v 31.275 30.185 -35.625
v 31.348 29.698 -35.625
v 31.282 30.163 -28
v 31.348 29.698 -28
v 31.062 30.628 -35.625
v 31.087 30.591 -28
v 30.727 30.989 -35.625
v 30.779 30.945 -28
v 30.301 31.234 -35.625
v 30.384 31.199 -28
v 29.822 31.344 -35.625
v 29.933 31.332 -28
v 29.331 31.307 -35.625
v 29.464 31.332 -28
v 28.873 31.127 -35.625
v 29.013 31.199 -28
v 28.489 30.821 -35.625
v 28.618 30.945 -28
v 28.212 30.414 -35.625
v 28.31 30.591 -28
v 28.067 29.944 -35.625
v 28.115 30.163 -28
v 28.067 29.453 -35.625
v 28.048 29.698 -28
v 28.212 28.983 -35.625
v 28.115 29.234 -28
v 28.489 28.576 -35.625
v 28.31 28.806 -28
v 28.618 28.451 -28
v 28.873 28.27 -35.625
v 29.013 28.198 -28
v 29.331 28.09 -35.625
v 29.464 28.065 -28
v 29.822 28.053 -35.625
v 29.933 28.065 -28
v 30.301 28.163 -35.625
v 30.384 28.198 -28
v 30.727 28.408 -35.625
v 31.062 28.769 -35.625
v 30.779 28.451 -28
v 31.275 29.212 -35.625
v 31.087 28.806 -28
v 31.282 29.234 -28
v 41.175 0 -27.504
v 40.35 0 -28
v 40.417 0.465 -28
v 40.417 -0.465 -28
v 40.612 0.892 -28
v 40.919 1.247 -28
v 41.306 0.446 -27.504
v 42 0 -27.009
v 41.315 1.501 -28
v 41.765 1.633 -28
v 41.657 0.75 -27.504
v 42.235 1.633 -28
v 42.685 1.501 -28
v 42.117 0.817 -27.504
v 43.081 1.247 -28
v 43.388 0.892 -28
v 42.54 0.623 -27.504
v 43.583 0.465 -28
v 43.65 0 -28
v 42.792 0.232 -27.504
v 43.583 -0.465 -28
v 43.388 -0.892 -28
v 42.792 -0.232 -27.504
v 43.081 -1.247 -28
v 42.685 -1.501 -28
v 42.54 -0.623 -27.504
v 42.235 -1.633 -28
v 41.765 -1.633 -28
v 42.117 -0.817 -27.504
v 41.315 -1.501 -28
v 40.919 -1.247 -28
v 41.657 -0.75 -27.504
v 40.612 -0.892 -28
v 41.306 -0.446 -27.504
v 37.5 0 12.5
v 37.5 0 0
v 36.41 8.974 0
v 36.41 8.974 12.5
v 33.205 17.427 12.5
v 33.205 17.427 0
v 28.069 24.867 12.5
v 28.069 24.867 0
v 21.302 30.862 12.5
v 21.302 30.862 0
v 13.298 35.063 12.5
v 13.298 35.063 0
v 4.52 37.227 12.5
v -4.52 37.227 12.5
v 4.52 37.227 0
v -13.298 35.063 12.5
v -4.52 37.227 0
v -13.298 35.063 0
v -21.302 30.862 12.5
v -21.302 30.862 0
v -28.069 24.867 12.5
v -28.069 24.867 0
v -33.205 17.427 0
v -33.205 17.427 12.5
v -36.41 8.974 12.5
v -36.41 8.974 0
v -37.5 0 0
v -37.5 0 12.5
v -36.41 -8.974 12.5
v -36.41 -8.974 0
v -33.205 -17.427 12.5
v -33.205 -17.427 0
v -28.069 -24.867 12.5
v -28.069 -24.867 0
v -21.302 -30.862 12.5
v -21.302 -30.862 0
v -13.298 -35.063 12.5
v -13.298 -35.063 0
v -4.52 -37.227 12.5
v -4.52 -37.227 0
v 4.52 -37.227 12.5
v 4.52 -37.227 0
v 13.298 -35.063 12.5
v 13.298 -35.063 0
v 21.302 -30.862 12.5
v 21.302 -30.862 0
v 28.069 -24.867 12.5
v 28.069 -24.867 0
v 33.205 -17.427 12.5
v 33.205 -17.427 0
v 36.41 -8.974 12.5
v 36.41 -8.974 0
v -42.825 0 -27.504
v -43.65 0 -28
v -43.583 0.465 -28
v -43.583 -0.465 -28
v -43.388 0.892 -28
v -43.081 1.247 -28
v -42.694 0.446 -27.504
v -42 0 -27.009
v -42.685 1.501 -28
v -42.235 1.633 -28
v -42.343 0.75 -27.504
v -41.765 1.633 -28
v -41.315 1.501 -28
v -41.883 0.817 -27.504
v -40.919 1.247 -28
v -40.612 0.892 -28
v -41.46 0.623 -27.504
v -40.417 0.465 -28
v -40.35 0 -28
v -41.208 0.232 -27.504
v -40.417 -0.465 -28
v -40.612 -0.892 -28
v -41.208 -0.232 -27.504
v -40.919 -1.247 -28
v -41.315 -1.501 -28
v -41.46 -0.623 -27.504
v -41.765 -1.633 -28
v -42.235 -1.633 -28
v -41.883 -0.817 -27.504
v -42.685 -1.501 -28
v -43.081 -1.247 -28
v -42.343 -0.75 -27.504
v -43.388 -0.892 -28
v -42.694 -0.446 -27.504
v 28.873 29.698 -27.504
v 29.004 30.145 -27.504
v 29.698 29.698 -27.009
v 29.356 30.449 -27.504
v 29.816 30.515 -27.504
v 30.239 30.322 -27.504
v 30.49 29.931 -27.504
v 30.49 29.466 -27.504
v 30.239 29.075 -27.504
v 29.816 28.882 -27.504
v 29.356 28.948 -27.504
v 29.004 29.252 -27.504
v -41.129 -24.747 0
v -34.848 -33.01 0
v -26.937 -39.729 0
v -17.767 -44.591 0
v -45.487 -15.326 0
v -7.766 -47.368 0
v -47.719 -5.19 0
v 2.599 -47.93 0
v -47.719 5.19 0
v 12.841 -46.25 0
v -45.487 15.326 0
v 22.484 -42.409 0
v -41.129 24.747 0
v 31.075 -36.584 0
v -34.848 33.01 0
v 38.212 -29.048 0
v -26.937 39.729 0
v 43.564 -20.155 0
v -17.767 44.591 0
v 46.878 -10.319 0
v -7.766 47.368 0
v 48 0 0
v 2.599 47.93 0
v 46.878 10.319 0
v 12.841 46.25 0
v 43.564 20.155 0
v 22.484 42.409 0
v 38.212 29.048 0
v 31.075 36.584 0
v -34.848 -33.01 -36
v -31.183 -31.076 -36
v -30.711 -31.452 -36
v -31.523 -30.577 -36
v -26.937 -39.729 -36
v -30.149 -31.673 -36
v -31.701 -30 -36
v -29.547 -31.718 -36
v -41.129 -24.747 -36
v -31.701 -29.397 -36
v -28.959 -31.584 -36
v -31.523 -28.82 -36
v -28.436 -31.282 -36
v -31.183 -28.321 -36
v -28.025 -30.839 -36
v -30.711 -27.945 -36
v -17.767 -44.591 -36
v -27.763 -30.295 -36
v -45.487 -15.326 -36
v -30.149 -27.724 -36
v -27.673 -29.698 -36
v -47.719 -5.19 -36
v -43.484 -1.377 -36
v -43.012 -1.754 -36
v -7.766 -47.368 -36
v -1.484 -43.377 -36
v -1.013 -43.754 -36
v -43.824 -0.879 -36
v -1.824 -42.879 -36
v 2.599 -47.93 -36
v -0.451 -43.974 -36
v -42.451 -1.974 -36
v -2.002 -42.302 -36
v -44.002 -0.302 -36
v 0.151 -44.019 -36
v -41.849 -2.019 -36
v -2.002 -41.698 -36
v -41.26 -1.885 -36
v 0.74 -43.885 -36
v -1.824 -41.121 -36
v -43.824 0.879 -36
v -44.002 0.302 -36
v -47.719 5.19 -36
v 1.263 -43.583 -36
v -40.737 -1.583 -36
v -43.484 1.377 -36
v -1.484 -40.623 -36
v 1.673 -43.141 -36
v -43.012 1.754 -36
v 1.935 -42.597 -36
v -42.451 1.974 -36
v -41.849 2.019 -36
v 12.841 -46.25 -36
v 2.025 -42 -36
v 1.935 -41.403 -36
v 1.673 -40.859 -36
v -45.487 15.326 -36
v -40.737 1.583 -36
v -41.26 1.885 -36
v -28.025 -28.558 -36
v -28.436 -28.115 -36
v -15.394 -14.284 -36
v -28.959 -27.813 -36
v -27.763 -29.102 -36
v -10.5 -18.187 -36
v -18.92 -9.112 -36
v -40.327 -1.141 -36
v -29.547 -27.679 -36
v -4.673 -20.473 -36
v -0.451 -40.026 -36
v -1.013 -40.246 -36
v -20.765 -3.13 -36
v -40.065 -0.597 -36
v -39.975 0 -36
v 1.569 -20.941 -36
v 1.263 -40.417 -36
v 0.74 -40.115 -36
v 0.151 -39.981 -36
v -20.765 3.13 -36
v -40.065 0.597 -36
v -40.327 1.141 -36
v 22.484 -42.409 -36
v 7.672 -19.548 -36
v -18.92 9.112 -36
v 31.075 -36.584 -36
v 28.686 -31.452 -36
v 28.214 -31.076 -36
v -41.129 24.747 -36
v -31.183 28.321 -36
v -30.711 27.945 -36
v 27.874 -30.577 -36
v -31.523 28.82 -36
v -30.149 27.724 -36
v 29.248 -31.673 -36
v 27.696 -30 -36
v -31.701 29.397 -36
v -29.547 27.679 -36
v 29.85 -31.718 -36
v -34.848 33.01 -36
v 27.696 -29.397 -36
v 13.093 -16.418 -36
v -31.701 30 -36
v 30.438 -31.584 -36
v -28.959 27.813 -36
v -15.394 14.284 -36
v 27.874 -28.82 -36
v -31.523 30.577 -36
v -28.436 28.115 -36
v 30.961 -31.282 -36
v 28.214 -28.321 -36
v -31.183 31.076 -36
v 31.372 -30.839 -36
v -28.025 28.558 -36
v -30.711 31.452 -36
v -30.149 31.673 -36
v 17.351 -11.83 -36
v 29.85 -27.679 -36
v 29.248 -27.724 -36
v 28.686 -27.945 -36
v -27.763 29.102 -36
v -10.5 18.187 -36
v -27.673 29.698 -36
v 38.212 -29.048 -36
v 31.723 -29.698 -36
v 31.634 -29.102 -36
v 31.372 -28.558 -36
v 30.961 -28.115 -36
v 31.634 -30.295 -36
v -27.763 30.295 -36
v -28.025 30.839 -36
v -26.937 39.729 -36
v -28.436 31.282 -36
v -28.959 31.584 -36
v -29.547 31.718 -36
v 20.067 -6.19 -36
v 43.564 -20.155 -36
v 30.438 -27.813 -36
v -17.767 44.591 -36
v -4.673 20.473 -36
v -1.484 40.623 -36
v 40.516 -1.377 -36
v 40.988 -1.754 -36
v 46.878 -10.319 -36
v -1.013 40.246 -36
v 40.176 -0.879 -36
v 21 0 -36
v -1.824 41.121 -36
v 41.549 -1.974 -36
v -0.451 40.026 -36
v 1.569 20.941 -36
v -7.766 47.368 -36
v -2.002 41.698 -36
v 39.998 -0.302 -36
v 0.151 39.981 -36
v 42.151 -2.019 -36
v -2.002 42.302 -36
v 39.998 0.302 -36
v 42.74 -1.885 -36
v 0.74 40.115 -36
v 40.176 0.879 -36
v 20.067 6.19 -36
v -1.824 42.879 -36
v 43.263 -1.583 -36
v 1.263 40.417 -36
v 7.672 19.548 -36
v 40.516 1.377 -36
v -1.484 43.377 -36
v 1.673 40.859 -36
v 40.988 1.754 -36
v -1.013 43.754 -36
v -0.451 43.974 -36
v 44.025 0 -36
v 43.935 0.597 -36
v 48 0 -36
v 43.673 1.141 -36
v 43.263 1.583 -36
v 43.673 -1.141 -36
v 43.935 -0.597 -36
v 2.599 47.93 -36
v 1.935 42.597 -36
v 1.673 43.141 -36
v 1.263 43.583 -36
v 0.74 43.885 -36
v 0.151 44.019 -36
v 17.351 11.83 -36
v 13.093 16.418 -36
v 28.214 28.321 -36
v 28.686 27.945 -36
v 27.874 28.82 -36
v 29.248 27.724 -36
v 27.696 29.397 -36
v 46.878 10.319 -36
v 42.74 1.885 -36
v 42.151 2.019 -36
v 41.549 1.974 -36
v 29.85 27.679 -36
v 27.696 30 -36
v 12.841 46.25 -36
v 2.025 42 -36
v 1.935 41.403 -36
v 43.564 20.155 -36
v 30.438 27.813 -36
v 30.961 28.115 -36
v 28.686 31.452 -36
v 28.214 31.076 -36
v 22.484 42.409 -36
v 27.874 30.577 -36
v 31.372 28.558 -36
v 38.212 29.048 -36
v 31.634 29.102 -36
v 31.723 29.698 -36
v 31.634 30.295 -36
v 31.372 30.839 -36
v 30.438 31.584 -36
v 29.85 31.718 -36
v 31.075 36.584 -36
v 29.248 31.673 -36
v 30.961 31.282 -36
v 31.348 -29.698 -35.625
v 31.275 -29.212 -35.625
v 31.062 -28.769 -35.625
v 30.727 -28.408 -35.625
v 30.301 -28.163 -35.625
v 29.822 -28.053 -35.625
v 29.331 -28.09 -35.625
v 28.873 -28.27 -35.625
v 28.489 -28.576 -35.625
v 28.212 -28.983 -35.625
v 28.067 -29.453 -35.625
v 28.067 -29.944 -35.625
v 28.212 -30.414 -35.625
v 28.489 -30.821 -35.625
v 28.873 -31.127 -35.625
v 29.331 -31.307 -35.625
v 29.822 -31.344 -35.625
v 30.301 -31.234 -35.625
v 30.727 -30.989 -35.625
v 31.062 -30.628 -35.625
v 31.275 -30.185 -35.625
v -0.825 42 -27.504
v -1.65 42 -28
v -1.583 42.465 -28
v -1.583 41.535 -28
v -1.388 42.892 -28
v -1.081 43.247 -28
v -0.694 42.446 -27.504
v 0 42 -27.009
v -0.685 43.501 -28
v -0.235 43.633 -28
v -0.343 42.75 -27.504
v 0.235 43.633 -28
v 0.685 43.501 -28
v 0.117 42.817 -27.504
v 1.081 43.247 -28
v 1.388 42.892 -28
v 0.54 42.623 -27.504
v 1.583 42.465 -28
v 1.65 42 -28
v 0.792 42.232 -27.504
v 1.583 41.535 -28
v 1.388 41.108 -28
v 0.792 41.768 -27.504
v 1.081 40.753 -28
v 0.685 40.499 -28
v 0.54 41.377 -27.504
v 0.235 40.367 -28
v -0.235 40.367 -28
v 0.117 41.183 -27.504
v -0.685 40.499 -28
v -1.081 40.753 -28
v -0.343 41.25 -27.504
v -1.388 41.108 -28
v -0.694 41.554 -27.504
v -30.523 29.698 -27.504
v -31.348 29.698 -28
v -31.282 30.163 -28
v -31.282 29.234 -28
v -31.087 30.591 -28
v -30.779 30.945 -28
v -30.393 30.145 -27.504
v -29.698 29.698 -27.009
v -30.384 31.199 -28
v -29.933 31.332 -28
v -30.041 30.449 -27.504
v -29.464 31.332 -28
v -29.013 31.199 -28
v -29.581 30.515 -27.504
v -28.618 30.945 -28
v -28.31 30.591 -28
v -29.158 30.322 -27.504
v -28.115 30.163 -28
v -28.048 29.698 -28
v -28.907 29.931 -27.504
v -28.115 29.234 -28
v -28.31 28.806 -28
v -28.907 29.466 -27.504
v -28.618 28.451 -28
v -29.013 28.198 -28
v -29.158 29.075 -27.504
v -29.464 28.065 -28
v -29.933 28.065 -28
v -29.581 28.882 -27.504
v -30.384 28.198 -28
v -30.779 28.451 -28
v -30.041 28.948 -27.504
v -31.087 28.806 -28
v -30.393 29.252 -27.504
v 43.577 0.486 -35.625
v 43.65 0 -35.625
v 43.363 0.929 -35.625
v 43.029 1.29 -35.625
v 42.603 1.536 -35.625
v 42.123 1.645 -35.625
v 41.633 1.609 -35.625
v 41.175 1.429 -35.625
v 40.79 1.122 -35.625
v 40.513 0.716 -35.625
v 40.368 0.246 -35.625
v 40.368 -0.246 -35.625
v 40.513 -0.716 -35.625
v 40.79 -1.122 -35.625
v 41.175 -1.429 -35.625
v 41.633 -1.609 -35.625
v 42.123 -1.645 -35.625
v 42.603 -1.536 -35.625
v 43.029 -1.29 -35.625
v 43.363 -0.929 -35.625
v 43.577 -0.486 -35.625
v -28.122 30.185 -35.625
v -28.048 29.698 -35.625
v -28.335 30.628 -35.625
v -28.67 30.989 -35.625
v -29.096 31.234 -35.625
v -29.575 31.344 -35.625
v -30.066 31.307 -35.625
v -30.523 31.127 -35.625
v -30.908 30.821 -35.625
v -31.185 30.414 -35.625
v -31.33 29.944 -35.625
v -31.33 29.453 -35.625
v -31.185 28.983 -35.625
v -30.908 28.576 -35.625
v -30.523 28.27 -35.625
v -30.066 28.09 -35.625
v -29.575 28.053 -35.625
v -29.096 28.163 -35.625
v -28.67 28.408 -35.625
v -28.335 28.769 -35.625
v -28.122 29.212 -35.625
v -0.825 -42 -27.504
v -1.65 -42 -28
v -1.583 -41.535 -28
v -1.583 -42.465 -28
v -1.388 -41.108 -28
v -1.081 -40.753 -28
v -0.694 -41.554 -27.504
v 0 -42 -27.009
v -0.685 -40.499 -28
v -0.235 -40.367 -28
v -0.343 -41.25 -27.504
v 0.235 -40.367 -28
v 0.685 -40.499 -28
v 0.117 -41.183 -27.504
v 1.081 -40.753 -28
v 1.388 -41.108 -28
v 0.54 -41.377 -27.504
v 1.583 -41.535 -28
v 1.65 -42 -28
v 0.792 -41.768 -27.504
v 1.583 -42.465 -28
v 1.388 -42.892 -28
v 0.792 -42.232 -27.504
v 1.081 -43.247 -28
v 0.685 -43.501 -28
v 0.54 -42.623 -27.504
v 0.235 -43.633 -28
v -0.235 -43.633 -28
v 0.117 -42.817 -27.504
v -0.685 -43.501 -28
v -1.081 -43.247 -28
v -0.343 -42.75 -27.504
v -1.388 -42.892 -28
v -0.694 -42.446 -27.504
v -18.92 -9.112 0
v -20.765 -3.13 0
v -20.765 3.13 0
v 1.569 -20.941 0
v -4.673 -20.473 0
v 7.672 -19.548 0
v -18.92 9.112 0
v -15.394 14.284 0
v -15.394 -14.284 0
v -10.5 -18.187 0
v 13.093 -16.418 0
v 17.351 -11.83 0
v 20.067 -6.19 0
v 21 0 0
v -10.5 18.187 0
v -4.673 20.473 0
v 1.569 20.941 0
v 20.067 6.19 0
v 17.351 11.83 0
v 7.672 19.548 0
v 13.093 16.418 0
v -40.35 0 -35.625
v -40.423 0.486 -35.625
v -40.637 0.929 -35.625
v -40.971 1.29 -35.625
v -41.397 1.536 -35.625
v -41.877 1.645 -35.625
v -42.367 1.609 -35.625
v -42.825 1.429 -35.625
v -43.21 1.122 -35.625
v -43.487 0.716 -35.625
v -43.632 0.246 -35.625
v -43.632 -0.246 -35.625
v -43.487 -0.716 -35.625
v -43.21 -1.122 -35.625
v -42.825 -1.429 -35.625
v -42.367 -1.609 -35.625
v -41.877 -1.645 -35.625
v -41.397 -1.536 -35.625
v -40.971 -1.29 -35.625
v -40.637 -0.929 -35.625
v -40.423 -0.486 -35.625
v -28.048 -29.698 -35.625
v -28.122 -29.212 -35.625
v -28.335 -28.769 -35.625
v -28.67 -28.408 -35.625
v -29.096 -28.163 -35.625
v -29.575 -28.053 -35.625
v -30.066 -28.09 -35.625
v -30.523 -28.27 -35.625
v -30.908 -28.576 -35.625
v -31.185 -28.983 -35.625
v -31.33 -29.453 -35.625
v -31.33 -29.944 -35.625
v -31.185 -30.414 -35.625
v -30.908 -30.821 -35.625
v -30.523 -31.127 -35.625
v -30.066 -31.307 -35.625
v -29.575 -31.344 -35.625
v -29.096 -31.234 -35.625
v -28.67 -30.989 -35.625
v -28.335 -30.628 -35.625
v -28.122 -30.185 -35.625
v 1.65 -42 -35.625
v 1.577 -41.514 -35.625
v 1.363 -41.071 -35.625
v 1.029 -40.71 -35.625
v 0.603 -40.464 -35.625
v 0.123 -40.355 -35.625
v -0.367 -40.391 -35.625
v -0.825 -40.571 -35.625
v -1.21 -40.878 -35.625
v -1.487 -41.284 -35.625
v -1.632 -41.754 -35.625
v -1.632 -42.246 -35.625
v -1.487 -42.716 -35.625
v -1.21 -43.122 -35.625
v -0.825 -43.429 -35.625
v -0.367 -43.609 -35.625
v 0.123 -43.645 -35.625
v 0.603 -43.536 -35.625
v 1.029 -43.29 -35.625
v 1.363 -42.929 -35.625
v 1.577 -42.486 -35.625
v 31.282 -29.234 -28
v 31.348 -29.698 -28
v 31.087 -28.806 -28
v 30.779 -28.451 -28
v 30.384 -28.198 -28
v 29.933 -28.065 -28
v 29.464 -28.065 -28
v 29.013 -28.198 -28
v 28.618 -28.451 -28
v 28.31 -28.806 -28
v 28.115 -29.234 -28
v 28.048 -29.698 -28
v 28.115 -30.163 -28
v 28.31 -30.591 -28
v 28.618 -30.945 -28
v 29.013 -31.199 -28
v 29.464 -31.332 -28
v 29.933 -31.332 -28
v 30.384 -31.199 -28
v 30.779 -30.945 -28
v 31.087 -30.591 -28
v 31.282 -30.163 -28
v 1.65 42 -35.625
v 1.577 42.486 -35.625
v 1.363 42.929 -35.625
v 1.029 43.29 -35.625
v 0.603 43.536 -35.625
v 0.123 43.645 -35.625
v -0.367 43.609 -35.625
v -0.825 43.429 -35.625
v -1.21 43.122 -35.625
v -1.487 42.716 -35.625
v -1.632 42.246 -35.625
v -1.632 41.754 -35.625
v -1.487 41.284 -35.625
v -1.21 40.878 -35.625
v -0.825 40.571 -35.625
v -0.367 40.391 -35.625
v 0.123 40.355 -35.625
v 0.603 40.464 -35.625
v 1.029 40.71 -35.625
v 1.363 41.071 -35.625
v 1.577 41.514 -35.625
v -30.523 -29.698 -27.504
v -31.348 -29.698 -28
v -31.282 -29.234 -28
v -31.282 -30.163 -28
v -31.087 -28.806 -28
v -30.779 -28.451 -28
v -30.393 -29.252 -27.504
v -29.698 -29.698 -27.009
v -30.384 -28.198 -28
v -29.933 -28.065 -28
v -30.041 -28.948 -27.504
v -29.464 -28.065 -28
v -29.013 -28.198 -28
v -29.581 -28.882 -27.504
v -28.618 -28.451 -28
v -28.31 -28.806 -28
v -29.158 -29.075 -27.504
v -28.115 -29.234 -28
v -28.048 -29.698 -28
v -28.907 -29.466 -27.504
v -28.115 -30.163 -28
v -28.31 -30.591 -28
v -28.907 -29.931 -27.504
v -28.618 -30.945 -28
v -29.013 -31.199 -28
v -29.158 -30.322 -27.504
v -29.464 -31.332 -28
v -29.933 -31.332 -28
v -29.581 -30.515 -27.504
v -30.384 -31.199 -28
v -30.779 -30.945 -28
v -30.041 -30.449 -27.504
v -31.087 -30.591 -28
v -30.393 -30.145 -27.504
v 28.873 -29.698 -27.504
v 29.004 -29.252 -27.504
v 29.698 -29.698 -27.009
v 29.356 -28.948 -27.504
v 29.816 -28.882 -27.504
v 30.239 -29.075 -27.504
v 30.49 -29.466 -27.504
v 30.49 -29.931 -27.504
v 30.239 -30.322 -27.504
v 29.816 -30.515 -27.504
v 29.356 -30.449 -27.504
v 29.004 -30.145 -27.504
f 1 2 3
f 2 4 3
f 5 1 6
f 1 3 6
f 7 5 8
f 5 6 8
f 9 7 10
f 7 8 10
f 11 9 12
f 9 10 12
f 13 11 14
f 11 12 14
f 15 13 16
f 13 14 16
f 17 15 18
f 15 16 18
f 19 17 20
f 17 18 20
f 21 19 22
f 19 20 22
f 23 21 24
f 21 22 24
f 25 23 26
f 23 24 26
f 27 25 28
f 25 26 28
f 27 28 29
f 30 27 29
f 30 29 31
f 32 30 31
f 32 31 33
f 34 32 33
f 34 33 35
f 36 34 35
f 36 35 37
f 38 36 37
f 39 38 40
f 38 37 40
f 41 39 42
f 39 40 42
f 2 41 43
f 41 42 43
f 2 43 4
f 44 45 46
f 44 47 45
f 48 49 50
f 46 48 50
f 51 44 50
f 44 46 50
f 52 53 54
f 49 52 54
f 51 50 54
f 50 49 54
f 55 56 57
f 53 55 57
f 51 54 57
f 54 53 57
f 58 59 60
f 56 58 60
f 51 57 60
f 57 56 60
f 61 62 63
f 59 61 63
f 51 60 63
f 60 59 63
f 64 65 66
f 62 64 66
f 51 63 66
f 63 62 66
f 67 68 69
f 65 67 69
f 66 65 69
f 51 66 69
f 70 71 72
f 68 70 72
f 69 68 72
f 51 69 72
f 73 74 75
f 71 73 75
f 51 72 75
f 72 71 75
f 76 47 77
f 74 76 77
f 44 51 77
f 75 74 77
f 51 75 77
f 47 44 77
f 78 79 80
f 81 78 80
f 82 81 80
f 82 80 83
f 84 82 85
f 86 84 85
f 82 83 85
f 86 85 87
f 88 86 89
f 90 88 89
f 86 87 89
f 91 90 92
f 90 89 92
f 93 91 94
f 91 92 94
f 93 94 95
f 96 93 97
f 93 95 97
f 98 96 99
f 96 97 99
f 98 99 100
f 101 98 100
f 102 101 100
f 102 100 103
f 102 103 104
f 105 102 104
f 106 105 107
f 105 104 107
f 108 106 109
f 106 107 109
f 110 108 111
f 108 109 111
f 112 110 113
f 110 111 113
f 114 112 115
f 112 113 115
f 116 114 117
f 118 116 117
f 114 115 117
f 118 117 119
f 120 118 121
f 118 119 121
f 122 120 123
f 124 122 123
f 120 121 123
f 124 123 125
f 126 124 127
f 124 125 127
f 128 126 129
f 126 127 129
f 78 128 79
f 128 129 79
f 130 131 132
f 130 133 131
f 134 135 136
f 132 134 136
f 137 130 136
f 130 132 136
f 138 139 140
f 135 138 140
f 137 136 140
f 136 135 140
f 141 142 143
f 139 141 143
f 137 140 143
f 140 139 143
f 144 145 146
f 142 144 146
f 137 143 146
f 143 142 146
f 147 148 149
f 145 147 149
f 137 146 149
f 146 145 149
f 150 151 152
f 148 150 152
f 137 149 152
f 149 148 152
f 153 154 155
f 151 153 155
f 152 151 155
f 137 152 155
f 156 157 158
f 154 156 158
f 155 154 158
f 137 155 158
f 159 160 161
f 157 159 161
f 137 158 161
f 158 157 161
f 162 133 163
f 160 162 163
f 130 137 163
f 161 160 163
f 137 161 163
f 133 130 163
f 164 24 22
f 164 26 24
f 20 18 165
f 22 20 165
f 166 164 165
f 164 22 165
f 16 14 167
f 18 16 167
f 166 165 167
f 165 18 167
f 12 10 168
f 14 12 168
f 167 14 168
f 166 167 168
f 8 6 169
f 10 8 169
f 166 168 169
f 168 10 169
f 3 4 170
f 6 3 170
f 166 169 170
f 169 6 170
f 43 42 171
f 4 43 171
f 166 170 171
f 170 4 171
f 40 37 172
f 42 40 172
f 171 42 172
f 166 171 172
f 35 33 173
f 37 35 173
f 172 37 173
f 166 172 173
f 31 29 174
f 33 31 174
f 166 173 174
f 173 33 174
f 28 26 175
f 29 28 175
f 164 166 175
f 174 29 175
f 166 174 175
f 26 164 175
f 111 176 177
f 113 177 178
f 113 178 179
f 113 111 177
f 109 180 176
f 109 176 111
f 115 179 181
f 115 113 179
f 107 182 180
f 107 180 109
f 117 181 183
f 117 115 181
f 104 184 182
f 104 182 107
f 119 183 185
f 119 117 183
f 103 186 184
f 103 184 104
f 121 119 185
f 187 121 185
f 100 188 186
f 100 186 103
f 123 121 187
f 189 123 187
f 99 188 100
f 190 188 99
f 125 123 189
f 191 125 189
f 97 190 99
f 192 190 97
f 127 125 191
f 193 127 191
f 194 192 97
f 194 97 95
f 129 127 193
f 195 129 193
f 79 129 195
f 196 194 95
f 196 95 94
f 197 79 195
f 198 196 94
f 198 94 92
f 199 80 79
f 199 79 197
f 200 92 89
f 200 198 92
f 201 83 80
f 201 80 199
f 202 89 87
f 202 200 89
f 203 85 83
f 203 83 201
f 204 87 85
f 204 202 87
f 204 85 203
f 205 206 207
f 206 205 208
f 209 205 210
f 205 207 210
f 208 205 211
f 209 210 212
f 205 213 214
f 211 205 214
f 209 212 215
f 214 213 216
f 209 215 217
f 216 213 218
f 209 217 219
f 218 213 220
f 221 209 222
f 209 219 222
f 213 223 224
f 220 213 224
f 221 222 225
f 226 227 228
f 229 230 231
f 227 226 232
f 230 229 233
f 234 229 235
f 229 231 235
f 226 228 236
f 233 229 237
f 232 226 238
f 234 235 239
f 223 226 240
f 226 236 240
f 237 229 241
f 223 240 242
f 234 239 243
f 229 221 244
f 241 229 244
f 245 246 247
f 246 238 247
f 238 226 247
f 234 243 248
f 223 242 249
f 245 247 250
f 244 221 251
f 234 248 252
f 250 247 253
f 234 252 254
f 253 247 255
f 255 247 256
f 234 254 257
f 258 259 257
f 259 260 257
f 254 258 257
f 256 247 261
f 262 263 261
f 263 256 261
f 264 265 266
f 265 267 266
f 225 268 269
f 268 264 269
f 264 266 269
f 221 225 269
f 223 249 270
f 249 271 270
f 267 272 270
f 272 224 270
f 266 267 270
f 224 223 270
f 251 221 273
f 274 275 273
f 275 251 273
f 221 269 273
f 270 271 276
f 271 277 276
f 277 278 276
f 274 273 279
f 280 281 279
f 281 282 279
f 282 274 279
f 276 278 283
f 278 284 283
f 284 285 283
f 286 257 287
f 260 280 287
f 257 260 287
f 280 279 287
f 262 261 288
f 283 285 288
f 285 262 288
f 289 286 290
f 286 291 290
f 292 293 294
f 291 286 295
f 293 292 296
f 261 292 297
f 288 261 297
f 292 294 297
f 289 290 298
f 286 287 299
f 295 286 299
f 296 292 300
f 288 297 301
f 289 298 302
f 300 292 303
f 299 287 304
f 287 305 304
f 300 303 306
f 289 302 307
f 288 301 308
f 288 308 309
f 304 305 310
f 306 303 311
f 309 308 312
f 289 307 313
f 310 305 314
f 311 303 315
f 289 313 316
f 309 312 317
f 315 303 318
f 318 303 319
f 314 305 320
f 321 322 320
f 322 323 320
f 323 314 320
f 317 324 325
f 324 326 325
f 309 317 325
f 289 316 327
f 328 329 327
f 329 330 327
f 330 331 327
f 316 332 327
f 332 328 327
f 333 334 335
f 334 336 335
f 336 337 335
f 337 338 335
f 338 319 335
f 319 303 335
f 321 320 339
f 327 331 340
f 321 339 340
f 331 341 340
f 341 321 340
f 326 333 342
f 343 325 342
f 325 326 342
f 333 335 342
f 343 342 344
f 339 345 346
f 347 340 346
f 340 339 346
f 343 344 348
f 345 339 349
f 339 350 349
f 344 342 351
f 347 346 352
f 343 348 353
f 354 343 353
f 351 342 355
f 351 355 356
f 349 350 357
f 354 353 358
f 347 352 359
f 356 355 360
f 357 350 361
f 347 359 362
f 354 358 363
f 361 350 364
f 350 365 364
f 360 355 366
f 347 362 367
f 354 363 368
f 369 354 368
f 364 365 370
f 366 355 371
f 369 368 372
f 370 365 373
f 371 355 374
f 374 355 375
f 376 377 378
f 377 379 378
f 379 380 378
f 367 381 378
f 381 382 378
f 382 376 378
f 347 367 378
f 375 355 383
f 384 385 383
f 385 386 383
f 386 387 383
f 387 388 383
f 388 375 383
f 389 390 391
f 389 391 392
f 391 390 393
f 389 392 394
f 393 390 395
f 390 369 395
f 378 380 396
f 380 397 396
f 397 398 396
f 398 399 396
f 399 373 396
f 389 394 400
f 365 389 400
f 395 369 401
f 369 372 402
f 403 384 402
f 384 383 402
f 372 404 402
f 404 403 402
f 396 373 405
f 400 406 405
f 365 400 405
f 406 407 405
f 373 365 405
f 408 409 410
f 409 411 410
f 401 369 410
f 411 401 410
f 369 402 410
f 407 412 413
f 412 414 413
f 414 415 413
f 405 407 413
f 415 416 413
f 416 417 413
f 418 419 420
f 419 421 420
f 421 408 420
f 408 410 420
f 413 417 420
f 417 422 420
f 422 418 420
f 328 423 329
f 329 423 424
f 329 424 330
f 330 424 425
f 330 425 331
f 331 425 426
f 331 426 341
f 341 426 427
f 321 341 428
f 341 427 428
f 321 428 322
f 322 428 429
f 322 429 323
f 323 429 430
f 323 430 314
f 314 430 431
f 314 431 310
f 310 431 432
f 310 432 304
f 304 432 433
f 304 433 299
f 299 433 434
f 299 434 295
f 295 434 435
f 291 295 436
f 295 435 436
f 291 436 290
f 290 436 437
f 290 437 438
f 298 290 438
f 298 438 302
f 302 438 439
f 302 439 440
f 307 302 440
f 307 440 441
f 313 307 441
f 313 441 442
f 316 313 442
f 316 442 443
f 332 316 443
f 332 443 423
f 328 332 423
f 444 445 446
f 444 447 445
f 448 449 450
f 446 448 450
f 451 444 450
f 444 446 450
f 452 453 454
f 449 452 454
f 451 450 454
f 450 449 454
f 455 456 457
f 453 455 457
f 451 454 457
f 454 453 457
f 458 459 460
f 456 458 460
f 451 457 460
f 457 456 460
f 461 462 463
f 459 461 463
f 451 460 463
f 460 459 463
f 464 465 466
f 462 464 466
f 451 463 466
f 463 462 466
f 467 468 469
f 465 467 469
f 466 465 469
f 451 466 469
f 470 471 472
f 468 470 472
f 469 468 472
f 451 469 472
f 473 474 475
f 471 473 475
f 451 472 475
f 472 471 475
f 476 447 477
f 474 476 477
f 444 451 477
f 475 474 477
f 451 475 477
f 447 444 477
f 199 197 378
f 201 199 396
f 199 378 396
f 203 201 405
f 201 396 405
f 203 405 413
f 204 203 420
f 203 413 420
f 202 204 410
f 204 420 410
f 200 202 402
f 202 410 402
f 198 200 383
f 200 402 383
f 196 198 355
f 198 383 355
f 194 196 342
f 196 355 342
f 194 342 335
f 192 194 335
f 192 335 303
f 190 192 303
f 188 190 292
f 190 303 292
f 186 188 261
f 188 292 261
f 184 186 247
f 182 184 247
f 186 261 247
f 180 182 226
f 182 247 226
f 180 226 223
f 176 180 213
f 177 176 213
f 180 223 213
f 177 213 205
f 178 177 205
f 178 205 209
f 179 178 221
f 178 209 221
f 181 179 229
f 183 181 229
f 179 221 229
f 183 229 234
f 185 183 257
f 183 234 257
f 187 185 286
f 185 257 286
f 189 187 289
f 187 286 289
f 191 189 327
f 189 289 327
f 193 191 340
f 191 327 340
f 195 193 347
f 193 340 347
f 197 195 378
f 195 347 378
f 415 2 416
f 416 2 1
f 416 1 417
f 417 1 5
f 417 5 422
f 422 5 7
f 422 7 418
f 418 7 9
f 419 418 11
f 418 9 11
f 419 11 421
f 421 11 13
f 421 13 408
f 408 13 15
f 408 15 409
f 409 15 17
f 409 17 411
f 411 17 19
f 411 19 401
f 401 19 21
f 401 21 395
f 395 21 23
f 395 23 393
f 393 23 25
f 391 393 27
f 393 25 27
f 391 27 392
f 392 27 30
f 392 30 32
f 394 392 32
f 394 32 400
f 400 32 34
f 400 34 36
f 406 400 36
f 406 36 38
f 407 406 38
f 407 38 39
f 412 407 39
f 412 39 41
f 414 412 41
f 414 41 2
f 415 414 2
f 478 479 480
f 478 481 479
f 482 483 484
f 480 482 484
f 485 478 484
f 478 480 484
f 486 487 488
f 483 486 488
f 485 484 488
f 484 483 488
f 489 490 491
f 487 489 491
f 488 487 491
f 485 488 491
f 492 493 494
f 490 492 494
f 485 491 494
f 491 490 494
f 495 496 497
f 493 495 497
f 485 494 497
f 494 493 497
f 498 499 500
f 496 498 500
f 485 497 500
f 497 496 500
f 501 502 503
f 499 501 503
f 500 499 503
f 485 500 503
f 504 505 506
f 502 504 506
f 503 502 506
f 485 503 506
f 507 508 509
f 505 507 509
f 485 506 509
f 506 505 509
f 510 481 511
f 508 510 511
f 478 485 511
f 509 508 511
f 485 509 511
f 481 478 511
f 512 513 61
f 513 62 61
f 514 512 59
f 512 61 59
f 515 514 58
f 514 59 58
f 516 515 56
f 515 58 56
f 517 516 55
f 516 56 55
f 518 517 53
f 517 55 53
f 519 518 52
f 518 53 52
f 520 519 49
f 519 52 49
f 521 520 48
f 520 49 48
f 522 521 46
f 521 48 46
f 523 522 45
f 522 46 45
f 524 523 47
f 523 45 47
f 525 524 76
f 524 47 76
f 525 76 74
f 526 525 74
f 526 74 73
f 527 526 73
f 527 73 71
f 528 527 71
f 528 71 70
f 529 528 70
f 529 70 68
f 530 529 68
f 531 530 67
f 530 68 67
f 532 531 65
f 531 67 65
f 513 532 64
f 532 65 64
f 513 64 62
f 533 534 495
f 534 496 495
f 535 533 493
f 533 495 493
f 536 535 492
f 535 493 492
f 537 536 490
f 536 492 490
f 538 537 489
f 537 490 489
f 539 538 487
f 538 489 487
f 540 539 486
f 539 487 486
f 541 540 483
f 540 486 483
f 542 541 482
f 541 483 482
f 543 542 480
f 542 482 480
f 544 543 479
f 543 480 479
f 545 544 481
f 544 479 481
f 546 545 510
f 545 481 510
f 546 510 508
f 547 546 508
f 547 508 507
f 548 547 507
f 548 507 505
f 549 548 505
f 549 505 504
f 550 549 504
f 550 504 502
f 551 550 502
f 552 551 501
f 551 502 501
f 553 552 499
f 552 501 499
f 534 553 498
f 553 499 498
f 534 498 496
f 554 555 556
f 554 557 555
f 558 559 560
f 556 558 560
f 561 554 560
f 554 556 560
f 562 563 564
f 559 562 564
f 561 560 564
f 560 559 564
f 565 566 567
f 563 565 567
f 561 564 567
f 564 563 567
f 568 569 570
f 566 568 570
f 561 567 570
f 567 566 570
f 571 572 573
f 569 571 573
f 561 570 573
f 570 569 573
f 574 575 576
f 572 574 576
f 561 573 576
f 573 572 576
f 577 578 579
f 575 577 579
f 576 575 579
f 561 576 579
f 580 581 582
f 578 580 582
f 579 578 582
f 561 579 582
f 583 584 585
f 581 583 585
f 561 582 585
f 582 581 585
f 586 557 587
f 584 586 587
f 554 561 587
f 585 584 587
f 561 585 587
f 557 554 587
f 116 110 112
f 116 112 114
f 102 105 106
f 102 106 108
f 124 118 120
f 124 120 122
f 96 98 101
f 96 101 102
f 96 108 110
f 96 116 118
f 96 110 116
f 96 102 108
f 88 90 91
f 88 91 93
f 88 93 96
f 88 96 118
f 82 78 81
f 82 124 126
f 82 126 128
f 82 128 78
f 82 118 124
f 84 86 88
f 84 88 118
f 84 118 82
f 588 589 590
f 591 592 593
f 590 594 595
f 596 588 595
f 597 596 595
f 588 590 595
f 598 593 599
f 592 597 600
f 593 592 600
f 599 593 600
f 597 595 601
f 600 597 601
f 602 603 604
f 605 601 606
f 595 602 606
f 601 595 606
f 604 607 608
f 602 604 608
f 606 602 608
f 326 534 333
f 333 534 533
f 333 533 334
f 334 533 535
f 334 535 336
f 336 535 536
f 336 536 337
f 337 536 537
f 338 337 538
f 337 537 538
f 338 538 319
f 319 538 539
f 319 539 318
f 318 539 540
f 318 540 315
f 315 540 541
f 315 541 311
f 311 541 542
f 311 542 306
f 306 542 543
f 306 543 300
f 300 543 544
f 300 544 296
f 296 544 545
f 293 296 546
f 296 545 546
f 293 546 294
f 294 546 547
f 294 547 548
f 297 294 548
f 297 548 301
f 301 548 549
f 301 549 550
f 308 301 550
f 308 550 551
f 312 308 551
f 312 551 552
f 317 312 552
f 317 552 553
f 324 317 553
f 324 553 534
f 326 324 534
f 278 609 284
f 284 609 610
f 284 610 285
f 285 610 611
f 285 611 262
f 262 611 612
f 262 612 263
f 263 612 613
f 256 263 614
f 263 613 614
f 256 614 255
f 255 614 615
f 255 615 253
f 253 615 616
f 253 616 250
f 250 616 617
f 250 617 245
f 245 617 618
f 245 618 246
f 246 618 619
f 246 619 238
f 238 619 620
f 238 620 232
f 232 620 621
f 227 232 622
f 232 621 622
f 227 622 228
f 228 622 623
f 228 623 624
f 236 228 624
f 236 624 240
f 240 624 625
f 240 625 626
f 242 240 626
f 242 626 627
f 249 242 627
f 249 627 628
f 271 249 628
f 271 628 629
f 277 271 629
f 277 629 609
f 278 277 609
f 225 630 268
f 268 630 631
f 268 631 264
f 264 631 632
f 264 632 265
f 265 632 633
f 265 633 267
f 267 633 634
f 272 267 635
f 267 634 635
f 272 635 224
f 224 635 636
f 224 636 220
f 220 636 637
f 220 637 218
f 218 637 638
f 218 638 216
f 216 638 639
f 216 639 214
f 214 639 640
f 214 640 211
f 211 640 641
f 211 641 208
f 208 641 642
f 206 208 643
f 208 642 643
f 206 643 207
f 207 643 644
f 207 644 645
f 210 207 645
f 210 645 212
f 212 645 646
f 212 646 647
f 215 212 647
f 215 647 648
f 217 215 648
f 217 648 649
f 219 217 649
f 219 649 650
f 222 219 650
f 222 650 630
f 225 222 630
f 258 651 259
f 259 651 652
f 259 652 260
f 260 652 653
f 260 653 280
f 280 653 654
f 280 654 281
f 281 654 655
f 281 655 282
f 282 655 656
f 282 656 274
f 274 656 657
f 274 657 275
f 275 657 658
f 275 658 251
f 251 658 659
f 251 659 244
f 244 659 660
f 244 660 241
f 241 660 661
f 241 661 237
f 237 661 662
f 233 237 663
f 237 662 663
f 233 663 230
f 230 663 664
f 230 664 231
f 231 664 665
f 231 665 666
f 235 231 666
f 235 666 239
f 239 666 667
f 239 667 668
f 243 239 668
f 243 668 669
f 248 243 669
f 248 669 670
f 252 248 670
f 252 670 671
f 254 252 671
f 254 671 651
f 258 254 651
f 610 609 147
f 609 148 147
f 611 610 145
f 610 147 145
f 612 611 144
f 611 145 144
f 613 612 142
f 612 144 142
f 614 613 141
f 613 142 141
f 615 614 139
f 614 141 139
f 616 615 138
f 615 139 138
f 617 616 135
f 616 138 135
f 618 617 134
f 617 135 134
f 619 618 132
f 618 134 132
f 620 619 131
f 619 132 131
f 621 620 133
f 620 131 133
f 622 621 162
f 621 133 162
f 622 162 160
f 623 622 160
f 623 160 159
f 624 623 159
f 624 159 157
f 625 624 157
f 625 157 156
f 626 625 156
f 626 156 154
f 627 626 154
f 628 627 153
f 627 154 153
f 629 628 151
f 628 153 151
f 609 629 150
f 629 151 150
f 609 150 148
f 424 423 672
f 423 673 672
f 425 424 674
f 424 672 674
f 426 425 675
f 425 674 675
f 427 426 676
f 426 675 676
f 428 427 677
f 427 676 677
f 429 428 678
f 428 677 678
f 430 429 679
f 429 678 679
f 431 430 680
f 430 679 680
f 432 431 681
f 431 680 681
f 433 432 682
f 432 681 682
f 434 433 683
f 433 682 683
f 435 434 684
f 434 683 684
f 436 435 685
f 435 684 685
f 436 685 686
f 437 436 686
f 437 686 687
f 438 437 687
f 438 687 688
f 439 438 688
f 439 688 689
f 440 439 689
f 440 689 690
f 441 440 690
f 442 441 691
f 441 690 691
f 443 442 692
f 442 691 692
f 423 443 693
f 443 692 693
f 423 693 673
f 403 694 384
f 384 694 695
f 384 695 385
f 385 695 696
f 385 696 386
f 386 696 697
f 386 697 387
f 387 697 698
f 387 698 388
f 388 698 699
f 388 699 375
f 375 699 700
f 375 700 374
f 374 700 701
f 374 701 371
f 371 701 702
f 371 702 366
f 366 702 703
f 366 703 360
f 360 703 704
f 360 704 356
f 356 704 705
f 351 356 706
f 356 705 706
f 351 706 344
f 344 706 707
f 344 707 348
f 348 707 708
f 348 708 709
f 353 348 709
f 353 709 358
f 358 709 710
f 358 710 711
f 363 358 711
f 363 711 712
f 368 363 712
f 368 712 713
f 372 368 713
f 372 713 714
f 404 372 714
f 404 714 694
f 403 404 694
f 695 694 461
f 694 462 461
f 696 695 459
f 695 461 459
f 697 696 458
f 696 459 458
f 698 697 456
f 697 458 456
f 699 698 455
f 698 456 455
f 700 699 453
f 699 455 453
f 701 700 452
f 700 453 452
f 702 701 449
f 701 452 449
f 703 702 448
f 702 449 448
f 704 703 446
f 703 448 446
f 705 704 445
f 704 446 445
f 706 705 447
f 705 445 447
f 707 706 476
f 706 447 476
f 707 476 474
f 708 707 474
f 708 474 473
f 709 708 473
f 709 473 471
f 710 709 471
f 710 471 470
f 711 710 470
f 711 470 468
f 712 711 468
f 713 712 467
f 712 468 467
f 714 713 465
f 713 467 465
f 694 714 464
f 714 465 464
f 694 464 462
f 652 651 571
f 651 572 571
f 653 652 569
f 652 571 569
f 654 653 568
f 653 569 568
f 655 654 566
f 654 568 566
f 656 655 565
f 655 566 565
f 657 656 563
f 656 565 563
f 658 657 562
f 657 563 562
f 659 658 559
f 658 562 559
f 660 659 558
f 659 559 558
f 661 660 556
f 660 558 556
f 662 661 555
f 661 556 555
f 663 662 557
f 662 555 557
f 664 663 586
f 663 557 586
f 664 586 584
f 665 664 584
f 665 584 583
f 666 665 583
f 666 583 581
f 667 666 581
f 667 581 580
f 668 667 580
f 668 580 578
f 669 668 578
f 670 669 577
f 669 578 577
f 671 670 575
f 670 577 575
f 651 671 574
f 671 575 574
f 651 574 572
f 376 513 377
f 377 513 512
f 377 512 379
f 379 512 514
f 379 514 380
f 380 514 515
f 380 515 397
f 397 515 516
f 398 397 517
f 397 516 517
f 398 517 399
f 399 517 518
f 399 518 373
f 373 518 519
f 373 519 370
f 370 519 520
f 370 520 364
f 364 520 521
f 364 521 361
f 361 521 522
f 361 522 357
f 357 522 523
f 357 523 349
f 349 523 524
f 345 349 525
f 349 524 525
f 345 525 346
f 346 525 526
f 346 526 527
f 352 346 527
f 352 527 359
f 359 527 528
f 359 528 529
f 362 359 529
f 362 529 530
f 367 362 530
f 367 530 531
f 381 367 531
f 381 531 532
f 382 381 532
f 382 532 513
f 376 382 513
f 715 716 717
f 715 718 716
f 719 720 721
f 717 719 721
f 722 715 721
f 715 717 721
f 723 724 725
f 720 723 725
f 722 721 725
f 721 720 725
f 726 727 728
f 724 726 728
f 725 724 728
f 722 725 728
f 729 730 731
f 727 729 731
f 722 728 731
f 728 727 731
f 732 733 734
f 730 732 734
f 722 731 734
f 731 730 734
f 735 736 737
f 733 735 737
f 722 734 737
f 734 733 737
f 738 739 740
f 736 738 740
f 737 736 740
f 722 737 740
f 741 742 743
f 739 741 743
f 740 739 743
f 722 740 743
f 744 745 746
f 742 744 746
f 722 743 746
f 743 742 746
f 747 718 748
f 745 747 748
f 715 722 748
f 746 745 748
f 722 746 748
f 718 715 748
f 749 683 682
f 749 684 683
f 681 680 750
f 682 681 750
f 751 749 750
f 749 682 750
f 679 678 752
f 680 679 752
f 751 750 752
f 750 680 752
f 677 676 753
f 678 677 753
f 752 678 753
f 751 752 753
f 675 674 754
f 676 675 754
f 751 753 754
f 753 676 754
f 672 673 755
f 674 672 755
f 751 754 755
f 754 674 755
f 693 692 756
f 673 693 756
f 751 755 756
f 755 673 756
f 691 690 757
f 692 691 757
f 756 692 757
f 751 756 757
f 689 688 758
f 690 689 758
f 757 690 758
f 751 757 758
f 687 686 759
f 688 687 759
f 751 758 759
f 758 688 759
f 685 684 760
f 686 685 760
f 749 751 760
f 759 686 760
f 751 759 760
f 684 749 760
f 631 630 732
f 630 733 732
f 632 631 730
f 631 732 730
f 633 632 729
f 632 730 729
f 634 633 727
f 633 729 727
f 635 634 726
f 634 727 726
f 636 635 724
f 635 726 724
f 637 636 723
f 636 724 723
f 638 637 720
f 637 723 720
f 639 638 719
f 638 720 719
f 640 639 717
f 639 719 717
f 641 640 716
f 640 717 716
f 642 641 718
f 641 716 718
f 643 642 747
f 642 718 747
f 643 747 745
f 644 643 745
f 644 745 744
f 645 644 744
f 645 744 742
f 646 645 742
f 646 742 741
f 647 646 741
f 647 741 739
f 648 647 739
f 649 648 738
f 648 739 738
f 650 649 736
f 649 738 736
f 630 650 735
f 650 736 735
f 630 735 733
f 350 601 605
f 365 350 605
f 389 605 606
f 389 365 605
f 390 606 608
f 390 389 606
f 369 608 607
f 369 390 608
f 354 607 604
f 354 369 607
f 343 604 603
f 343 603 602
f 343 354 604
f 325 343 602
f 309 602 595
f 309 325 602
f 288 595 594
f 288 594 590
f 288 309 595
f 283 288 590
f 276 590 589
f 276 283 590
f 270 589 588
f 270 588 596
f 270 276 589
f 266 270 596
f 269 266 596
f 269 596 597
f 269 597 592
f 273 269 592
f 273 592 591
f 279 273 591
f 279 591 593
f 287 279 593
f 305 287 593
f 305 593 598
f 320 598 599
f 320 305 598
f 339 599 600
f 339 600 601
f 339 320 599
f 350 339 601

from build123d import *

# Parameters (mm, degrees)
SKETCH1_R                   = 37.5
BOSS_EXTRUDE1_DEPTH         = 12.5
SKETCH1_3_R                 = 48
SKETCH1_3_R_2               = 21
BOSS_EXTRUDE2_DEPTH         = 36
M4_TAPPED_HOLE1_D           = 3.3
M4_TAPPED_HOLE1_DEPTH       = 8
M4_TAPPED_HOLE1_CSINK_D     = 4.05
M4_TAPPED_HOLE1_CSINK_ANGLE = 90
M4_TAPPED_HOLE1_TIP         = 0.991420021


with BuildPart() as part:
    # Sketch1 → Boss-Extrude1 (new body)
    with BuildSketch(Plane.XY):
        Circle(SKETCH1_R)
    extrude(amount=BOSS_EXTRUDE1_DEPTH)

    # Sketch1<3> → Boss-Extrude2 (add)
    with BuildSketch(Plane.XY):
        Circle(SKETCH1_3_R)
        Circle(SKETCH1_3_R_2, mode=Mode.SUBTRACT)
    extrude(amount=-BOSS_EXTRUDE2_DEPTH)

    # M4 Tapped Hole1
    with Locations(Plane(origin=(0, 0, -36), x_dir=(-1, 0, 0), z_dir=(0, 0, -1))):
        with Locations((0, 42), (29.69848481, 29.69848481), (42, 0), (29.69848481, -29.69848481), (0, -42), (-29.69848481, -29.69848481), (-42, 0), (-29.69848481, 29.69848481)):
            CounterSinkHole(M4_TAPPED_HOLE1_D / 2, M4_TAPPED_HOLE1_CSINK_D / 2, depth=M4_TAPPED_HOLE1_DEPTH, counter_sink_angle=M4_TAPPED_HOLE1_CSINK_ANGLE)
            with Locations((0, 0, -(M4_TAPPED_HOLE1_DEPTH + M4_TAPPED_HOLE1_TIP / 2))):  # 118° drill point
                Cone(0, M4_TAPPED_HOLE1_D / 2, M4_TAPPED_HOLE1_TIP, mode=Mode.SUBTRACT)


solid = part.part
